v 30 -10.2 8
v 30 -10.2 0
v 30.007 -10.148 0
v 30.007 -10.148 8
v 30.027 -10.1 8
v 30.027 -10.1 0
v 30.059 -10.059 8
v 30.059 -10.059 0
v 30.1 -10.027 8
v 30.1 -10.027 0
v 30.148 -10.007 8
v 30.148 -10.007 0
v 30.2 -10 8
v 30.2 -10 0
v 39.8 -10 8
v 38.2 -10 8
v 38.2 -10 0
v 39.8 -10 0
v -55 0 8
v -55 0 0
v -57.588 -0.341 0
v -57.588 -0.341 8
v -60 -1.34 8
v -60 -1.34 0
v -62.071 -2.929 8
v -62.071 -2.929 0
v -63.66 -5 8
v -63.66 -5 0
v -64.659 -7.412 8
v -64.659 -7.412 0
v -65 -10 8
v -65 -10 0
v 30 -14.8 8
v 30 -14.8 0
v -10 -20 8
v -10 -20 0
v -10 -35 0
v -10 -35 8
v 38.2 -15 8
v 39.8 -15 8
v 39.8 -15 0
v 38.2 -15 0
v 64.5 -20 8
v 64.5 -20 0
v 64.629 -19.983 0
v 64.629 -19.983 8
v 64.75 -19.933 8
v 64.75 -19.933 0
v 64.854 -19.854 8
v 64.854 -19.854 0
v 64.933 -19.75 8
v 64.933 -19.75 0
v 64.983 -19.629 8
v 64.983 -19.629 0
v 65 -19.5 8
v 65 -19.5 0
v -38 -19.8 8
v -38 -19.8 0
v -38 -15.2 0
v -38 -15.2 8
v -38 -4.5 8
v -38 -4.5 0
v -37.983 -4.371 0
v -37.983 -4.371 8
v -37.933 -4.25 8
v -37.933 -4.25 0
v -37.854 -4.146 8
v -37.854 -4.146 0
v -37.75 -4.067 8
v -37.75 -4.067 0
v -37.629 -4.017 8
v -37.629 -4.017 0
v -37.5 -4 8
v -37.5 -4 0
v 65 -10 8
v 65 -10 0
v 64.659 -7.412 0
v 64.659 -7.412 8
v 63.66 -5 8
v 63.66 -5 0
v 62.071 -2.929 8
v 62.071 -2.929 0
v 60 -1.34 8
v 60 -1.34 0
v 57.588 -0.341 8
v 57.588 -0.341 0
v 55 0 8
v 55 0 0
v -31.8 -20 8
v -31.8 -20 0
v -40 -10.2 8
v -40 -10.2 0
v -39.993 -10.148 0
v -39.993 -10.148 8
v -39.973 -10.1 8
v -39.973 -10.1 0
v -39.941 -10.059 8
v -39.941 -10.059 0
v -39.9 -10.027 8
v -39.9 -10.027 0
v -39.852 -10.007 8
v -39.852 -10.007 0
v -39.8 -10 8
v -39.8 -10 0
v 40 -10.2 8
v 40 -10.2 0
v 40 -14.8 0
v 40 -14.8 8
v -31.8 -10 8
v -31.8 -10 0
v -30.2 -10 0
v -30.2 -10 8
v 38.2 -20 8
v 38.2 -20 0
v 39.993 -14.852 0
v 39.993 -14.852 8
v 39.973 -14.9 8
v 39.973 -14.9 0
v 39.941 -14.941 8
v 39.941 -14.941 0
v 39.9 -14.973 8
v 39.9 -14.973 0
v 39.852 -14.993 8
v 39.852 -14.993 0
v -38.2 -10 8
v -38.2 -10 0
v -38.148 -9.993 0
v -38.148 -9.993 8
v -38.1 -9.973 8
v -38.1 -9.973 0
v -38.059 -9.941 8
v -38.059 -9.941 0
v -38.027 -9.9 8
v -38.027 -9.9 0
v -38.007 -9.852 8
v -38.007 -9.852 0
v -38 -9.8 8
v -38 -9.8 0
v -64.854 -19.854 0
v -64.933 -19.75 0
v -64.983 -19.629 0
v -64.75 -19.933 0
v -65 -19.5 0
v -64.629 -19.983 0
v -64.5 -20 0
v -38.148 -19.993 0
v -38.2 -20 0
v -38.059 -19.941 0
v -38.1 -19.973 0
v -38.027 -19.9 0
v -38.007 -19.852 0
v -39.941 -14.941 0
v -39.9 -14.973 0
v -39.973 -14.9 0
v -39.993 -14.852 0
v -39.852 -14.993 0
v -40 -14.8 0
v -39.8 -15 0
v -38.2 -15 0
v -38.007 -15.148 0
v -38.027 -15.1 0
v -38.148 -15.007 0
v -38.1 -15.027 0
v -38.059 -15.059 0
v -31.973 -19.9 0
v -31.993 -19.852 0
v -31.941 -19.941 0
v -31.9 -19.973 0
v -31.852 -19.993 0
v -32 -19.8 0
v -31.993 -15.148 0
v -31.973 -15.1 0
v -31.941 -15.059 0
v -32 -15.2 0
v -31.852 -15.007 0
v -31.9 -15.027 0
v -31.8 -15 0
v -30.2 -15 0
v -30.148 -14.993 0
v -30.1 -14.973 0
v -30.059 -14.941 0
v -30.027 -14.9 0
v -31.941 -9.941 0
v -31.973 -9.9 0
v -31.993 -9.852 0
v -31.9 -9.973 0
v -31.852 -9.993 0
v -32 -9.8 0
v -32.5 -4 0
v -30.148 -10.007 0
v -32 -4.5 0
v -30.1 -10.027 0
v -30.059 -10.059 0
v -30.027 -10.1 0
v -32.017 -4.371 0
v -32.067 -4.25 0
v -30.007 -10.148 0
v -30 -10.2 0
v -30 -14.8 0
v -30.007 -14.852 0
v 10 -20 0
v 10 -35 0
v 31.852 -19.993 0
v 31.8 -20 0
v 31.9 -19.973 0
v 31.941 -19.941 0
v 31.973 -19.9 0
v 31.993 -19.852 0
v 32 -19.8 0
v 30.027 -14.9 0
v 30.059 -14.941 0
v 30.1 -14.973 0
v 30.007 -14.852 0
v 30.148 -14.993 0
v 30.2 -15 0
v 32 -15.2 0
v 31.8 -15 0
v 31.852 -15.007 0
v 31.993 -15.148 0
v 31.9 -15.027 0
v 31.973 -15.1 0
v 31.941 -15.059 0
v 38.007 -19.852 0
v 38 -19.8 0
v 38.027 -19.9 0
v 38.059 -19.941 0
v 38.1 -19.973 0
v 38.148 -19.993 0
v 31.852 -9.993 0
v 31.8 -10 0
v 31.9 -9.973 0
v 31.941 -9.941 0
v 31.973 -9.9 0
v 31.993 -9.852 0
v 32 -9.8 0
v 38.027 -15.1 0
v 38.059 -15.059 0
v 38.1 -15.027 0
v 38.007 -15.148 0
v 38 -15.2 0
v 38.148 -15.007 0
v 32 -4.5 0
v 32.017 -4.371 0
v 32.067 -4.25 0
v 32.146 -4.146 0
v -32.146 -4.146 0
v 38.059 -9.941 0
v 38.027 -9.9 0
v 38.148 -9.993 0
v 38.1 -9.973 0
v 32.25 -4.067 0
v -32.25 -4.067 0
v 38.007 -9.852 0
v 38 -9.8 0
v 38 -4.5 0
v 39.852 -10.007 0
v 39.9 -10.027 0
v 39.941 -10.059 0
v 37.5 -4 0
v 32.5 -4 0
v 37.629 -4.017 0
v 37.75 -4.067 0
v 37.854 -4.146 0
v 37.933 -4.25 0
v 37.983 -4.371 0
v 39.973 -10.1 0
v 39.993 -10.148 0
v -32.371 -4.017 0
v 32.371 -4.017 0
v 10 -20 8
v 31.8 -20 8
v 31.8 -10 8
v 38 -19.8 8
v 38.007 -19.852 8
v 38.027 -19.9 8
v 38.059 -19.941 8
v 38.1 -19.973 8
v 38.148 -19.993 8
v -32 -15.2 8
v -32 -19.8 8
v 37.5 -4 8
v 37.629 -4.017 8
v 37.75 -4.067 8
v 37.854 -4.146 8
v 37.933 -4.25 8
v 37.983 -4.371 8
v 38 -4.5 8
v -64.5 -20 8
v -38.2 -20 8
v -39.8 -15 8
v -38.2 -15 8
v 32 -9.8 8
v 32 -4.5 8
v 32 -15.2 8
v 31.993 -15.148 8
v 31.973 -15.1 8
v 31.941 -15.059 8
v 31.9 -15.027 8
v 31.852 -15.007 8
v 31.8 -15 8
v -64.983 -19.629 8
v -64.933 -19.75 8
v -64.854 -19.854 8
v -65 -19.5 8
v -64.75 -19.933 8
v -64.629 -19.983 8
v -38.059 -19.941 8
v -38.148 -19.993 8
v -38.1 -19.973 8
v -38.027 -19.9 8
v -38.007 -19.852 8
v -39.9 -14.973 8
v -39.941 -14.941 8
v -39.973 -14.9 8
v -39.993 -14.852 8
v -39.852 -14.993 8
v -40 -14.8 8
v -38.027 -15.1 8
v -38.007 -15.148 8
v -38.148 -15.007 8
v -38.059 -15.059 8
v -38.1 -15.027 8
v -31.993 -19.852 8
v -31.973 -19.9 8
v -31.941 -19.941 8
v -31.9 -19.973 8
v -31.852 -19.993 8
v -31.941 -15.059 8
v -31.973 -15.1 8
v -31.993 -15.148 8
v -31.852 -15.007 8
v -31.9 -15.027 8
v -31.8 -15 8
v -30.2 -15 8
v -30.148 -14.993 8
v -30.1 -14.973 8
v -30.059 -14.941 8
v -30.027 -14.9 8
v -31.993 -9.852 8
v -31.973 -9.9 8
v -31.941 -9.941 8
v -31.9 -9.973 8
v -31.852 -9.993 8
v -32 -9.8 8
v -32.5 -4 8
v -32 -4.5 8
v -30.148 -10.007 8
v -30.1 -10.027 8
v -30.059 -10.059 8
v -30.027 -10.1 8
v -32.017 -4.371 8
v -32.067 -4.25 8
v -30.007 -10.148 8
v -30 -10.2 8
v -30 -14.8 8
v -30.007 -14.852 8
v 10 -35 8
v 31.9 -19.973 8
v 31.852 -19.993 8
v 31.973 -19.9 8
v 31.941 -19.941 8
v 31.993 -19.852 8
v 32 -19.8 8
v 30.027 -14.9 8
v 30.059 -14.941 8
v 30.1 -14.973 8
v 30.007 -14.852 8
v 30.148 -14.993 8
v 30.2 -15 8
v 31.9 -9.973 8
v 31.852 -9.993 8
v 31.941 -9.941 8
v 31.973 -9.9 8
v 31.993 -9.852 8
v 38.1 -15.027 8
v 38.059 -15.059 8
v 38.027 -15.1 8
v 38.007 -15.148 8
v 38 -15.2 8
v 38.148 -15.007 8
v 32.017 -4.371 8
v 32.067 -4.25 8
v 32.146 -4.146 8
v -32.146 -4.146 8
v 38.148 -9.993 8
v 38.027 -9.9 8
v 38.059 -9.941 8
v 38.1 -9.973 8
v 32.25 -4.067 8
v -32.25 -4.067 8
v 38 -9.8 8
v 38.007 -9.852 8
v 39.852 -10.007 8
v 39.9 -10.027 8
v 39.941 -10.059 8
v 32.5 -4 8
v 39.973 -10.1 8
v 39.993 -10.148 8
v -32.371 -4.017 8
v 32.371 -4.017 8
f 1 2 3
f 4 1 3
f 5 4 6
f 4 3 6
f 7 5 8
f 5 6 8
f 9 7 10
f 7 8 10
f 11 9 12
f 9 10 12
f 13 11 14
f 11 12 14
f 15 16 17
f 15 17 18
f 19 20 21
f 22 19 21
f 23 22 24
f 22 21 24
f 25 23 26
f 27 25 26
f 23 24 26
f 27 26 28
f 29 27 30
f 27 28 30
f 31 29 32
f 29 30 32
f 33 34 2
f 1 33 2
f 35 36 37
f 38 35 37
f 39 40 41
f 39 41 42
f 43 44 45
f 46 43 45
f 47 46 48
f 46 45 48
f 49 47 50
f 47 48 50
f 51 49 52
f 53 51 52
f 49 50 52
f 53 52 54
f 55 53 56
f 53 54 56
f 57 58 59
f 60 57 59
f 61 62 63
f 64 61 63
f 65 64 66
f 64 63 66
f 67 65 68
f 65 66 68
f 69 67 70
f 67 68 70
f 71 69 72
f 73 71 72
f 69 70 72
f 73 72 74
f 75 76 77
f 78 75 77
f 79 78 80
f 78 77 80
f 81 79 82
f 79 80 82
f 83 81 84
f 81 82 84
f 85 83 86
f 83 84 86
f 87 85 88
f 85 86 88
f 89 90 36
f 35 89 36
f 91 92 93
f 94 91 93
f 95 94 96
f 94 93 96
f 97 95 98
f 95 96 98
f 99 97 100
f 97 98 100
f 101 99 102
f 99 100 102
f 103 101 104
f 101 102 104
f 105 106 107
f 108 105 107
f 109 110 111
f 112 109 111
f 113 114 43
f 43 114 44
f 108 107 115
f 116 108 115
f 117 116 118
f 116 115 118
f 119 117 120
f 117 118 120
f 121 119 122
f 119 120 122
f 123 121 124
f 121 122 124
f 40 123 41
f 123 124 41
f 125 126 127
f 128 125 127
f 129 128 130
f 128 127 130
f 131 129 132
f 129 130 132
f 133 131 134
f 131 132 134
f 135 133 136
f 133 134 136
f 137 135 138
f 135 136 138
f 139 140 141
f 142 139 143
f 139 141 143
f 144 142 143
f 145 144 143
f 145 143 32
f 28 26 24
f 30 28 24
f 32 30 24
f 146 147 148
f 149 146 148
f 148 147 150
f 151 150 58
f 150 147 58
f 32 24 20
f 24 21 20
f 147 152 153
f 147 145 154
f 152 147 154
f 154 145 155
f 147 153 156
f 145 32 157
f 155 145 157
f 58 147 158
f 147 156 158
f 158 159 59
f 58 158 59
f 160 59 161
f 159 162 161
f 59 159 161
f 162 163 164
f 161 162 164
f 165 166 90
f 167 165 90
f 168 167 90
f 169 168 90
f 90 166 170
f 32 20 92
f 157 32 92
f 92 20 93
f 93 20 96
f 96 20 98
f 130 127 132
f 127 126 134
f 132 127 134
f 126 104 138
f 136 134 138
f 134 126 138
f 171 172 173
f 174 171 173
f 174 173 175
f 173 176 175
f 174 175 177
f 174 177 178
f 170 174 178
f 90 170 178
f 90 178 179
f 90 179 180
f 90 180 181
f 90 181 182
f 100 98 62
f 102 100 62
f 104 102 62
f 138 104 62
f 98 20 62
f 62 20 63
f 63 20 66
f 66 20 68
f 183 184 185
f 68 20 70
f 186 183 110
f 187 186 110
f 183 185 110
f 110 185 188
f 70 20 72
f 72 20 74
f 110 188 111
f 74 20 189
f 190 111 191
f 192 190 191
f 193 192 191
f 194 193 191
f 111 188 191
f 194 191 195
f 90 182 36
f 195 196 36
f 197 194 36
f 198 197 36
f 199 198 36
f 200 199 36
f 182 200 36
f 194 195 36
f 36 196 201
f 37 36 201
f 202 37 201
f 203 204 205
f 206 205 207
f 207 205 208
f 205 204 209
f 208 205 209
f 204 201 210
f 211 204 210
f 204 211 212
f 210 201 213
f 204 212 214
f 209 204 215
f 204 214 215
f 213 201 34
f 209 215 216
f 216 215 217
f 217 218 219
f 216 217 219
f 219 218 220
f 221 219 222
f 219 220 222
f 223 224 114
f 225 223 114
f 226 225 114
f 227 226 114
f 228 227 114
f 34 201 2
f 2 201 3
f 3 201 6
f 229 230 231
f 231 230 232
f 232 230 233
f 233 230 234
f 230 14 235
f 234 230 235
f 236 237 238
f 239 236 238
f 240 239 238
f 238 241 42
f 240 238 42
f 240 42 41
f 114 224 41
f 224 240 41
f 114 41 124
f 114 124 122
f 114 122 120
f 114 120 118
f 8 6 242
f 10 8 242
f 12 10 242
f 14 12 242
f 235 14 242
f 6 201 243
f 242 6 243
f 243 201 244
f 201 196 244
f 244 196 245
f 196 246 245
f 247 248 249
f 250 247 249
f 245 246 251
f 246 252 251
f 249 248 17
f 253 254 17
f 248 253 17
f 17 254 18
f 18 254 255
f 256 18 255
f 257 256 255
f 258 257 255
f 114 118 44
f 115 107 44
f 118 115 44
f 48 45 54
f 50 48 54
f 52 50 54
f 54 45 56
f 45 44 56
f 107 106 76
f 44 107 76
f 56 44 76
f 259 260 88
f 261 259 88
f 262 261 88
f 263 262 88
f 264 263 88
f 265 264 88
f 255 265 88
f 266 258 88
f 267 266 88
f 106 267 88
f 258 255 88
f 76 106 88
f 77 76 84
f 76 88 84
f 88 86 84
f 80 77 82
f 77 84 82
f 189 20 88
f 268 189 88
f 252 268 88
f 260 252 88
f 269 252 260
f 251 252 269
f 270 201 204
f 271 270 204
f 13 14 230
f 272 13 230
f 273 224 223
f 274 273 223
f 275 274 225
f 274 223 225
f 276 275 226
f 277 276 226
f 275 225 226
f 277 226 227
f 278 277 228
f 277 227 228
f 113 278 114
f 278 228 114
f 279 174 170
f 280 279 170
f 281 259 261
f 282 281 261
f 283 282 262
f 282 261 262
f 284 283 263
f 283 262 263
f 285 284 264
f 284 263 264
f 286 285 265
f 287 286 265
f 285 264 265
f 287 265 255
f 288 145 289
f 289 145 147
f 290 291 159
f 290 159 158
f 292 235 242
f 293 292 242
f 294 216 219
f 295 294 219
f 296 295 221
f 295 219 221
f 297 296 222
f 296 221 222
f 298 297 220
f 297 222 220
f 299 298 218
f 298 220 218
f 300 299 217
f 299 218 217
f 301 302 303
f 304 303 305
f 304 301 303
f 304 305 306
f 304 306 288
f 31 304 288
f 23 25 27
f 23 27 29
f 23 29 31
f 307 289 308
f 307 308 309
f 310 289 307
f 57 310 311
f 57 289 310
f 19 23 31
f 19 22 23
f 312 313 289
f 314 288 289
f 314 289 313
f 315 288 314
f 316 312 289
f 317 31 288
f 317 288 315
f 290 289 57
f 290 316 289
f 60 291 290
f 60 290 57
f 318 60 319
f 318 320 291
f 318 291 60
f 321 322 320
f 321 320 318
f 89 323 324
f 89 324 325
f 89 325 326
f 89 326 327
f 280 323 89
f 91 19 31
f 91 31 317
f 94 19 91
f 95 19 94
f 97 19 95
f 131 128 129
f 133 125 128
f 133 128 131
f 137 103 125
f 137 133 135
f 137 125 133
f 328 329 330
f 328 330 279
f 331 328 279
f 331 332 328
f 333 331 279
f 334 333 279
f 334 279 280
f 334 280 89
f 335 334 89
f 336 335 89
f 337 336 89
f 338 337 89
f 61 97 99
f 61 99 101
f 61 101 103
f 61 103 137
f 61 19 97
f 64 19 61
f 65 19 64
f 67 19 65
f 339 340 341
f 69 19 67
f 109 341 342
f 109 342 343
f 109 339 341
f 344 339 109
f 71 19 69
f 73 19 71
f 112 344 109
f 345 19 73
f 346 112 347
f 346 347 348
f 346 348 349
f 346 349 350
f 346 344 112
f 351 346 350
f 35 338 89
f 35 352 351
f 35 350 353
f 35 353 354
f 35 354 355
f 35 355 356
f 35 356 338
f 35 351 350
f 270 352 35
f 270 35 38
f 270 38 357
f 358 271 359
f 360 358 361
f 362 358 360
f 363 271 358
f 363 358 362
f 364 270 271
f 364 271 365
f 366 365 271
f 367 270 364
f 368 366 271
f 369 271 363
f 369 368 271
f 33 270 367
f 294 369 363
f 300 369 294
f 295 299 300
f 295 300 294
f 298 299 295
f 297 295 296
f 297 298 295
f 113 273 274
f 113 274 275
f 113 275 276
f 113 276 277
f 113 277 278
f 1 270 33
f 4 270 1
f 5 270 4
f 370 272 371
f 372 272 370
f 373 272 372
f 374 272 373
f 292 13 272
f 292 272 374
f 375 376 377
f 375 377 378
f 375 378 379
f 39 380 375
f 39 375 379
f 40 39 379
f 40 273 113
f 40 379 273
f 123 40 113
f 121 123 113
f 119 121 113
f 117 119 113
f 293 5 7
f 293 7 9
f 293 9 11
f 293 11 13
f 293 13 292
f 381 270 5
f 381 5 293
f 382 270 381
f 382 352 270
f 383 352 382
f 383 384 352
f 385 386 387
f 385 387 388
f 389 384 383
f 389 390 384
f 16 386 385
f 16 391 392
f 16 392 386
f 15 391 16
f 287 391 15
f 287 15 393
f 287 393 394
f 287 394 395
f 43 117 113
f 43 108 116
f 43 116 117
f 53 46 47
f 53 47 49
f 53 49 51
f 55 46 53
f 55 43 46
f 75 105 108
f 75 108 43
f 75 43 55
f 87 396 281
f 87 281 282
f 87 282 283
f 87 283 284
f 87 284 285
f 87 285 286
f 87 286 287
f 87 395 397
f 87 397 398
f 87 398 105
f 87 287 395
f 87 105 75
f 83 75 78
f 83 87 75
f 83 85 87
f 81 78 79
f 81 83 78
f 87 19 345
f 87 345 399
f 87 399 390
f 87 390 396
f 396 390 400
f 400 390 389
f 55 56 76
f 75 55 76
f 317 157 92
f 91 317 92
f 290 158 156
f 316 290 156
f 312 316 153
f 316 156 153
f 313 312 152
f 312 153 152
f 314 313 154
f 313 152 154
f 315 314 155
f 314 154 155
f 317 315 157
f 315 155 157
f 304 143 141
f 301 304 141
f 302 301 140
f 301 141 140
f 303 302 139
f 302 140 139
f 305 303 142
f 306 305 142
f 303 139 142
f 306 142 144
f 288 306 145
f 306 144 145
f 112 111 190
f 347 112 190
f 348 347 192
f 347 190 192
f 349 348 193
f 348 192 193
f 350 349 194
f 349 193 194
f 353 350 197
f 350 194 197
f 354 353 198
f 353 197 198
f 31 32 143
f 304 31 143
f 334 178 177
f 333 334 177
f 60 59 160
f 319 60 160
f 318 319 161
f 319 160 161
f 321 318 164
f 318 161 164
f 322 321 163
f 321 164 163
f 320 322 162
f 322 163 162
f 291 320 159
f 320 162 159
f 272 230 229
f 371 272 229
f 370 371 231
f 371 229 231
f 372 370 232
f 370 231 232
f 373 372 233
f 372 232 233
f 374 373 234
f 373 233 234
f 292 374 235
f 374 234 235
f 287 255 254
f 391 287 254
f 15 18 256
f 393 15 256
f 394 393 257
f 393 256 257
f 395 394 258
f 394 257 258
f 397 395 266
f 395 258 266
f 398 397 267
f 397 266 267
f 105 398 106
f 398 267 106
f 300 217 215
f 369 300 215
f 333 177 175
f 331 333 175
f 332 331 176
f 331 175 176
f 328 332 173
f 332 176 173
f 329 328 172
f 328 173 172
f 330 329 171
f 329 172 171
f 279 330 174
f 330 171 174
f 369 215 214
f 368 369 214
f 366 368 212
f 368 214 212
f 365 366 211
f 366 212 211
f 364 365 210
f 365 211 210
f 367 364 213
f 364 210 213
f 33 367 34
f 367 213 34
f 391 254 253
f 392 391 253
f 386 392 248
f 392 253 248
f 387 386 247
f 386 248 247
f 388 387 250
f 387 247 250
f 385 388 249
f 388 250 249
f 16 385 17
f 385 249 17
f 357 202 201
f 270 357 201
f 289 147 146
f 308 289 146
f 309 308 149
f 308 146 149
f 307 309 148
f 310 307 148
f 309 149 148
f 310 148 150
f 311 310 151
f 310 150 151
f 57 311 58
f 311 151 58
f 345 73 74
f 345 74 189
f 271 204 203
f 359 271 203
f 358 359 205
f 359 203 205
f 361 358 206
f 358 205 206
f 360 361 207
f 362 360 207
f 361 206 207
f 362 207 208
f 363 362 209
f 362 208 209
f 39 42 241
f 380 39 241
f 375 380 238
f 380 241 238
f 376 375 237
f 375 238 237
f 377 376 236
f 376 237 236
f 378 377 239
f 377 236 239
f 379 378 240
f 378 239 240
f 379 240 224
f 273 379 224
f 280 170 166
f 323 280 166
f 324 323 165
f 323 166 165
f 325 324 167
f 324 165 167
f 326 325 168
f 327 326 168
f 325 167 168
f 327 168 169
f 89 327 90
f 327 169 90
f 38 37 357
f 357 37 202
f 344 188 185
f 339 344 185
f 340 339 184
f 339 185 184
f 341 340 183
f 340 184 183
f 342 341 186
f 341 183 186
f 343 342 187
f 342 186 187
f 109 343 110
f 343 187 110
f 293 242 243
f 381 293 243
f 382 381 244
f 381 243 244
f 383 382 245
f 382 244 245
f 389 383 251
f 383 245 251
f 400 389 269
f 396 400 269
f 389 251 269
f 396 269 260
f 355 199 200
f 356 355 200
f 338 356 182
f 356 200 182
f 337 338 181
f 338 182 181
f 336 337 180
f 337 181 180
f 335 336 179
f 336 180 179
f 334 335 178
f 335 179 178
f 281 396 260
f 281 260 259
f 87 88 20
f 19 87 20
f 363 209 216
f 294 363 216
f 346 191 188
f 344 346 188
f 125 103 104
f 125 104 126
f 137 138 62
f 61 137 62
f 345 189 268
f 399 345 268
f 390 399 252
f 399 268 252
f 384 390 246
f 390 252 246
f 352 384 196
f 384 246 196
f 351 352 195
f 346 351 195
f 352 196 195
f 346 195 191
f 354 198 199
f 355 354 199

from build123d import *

# Parameters (mm, degrees)
BOSS_EXTRUDE1_DEPTH = 8


with BuildPart() as part:
    # Model → Boss-Extrude1 (new body)
    with BuildSketch(Plane.XY):
        with BuildLine():
            Line((-65, -10), (-65, -19.5))
            ThreePointArc((-65, -19.5), (-64.853553391, -19.853553391), (-64.5, -20))
            Line((-64.5, -20), (-38.2, -20))
            ThreePointArc((-38.2, -20), (-38.058578644, -19.941421356), (-38, -19.8))
            Line((-38, -19.8), (-38, -15.2))
            ThreePointArc((-38, -15.2), (-38.058578644, -15.058578644), (-38.2, -15))
            Line((-38.2, -15), (-39.8, -15))
            ThreePointArc((-39.8, -15), (-39.941421356, -14.941421356), (-40, -14.8))
            Line((-40, -14.8), (-40, -10.2))
            ThreePointArc((-40, -10.2), (-39.941421356, -10.058578644), (-39.8, -10))
            Line((-39.8, -10), (-38.2, -10))
            ThreePointArc((-38.2, -10), (-38.058578644, -9.941421356), (-38, -9.8))
            Line((-38, -9.8), (-38, -4.5))
            ThreePointArc((-38, -4.5), (-37.853553391, -4.146446609), (-37.5, -4))
            Line((-37.5, -4), (-32.5, -4))
            ThreePointArc((-32.5, -4), (-32.146446609, -4.146446609), (-32, -4.5))
            Line((-32, -4.5), (-32, -9.8))
            ThreePointArc((-32, -9.8), (-31.941421356, -9.941421356), (-31.8, -10))
            Line((-31.8, -10), (-30.2, -10))
            ThreePointArc((-30.2, -10), (-30.058578644, -10.058578644), (-30, -10.2))
            Line((-30, -10.2), (-30, -14.8))
            ThreePointArc((-30, -14.8), (-30.058578644, -14.941421356), (-30.2, -15))
            Line((-30.2, -15), (-31.8, -15))
            ThreePointArc((-31.8, -15), (-31.941421356, -15.058578644), (-32, -15.2))
            Line((-32, -15.2), (-32, -19.8))
            ThreePointArc((-32, -19.8), (-31.941421356, -19.941421356), (-31.8, -20))
            Line((-31.8, -20), (-10, -20))
            Line((-10, -20), (-10, -35))
            Line((-10, -35), (10, -35))
            Line((10, -35), (10, -20))
            Line((10, -20), (31.8, -20))
            ThreePointArc((31.8, -20), (31.941421356, -19.941421356), (32, -19.8))
            Line((32, -19.8), (32, -15.2))
            ThreePointArc((32, -15.2), (31.941421356, -15.058578644), (31.8, -15))
            Line((31.8, -15), (30.2, -15))
            ThreePointArc((30.2, -15), (30.058578644, -14.941421356), (30, -14.8))
            Line((30, -14.8), (30, -10.2))
            ThreePointArc((30, -10.2), (30.058578644, -10.058578644), (30.2, -10))
            Line((30.2, -10), (31.8, -10))
            ThreePointArc((31.8, -10), (31.941421356, -9.941421356), (32, -9.8))
            Line((32, -9.8), (32, -4.5))
            ThreePointArc((32, -4.5), (32.146446609, -4.146446609), (32.5, -4))
            Line((32.5, -4), (37.5, -4))
            ThreePointArc((37.5, -4), (37.853553391, -4.146446609), (38, -4.5))
            Line((38, -4.5), (38, -9.8))
            ThreePointArc((38, -9.8), (38.058578644, -9.941421356), (38.2, -10))
            Line((38.2, -10), (39.8, -10))
            ThreePointArc((39.8, -10), (39.941421356, -10.058578644), (40, -10.2))
            Line((40, -10.2), (40, -14.8))
            ThreePointArc((40, -14.8), (39.941421356, -14.941421356), (39.8, -15))
            Line((39.8, -15), (38.2, -15))
            ThreePointArc((38.2, -15), (38.058578644, -15.058578644), (38, -15.2))
            Line((38, -15.2), (38, -19.8))
            ThreePointArc((38, -19.8), (38.058578644, -19.941421356), (38.2, -20))
            Line((38.2, -20), (64.5, -20))
            ThreePointArc((64.5, -20), (64.853553391, -19.853553391), (65, -19.5))
            Line((65, -19.5), (65, -10))
            ThreePointArc((65, -10), (62.071067812, -2.928932188), (55, 0))
            Line((55, 0), (-55, 0))
            ThreePointArc((-55, 0), (-62.071067812, -2.928932188), (-65, -10))
        make_face()
    extrude(amount=BOSS_EXTRUDE1_DEPTH)


solid = part.part
